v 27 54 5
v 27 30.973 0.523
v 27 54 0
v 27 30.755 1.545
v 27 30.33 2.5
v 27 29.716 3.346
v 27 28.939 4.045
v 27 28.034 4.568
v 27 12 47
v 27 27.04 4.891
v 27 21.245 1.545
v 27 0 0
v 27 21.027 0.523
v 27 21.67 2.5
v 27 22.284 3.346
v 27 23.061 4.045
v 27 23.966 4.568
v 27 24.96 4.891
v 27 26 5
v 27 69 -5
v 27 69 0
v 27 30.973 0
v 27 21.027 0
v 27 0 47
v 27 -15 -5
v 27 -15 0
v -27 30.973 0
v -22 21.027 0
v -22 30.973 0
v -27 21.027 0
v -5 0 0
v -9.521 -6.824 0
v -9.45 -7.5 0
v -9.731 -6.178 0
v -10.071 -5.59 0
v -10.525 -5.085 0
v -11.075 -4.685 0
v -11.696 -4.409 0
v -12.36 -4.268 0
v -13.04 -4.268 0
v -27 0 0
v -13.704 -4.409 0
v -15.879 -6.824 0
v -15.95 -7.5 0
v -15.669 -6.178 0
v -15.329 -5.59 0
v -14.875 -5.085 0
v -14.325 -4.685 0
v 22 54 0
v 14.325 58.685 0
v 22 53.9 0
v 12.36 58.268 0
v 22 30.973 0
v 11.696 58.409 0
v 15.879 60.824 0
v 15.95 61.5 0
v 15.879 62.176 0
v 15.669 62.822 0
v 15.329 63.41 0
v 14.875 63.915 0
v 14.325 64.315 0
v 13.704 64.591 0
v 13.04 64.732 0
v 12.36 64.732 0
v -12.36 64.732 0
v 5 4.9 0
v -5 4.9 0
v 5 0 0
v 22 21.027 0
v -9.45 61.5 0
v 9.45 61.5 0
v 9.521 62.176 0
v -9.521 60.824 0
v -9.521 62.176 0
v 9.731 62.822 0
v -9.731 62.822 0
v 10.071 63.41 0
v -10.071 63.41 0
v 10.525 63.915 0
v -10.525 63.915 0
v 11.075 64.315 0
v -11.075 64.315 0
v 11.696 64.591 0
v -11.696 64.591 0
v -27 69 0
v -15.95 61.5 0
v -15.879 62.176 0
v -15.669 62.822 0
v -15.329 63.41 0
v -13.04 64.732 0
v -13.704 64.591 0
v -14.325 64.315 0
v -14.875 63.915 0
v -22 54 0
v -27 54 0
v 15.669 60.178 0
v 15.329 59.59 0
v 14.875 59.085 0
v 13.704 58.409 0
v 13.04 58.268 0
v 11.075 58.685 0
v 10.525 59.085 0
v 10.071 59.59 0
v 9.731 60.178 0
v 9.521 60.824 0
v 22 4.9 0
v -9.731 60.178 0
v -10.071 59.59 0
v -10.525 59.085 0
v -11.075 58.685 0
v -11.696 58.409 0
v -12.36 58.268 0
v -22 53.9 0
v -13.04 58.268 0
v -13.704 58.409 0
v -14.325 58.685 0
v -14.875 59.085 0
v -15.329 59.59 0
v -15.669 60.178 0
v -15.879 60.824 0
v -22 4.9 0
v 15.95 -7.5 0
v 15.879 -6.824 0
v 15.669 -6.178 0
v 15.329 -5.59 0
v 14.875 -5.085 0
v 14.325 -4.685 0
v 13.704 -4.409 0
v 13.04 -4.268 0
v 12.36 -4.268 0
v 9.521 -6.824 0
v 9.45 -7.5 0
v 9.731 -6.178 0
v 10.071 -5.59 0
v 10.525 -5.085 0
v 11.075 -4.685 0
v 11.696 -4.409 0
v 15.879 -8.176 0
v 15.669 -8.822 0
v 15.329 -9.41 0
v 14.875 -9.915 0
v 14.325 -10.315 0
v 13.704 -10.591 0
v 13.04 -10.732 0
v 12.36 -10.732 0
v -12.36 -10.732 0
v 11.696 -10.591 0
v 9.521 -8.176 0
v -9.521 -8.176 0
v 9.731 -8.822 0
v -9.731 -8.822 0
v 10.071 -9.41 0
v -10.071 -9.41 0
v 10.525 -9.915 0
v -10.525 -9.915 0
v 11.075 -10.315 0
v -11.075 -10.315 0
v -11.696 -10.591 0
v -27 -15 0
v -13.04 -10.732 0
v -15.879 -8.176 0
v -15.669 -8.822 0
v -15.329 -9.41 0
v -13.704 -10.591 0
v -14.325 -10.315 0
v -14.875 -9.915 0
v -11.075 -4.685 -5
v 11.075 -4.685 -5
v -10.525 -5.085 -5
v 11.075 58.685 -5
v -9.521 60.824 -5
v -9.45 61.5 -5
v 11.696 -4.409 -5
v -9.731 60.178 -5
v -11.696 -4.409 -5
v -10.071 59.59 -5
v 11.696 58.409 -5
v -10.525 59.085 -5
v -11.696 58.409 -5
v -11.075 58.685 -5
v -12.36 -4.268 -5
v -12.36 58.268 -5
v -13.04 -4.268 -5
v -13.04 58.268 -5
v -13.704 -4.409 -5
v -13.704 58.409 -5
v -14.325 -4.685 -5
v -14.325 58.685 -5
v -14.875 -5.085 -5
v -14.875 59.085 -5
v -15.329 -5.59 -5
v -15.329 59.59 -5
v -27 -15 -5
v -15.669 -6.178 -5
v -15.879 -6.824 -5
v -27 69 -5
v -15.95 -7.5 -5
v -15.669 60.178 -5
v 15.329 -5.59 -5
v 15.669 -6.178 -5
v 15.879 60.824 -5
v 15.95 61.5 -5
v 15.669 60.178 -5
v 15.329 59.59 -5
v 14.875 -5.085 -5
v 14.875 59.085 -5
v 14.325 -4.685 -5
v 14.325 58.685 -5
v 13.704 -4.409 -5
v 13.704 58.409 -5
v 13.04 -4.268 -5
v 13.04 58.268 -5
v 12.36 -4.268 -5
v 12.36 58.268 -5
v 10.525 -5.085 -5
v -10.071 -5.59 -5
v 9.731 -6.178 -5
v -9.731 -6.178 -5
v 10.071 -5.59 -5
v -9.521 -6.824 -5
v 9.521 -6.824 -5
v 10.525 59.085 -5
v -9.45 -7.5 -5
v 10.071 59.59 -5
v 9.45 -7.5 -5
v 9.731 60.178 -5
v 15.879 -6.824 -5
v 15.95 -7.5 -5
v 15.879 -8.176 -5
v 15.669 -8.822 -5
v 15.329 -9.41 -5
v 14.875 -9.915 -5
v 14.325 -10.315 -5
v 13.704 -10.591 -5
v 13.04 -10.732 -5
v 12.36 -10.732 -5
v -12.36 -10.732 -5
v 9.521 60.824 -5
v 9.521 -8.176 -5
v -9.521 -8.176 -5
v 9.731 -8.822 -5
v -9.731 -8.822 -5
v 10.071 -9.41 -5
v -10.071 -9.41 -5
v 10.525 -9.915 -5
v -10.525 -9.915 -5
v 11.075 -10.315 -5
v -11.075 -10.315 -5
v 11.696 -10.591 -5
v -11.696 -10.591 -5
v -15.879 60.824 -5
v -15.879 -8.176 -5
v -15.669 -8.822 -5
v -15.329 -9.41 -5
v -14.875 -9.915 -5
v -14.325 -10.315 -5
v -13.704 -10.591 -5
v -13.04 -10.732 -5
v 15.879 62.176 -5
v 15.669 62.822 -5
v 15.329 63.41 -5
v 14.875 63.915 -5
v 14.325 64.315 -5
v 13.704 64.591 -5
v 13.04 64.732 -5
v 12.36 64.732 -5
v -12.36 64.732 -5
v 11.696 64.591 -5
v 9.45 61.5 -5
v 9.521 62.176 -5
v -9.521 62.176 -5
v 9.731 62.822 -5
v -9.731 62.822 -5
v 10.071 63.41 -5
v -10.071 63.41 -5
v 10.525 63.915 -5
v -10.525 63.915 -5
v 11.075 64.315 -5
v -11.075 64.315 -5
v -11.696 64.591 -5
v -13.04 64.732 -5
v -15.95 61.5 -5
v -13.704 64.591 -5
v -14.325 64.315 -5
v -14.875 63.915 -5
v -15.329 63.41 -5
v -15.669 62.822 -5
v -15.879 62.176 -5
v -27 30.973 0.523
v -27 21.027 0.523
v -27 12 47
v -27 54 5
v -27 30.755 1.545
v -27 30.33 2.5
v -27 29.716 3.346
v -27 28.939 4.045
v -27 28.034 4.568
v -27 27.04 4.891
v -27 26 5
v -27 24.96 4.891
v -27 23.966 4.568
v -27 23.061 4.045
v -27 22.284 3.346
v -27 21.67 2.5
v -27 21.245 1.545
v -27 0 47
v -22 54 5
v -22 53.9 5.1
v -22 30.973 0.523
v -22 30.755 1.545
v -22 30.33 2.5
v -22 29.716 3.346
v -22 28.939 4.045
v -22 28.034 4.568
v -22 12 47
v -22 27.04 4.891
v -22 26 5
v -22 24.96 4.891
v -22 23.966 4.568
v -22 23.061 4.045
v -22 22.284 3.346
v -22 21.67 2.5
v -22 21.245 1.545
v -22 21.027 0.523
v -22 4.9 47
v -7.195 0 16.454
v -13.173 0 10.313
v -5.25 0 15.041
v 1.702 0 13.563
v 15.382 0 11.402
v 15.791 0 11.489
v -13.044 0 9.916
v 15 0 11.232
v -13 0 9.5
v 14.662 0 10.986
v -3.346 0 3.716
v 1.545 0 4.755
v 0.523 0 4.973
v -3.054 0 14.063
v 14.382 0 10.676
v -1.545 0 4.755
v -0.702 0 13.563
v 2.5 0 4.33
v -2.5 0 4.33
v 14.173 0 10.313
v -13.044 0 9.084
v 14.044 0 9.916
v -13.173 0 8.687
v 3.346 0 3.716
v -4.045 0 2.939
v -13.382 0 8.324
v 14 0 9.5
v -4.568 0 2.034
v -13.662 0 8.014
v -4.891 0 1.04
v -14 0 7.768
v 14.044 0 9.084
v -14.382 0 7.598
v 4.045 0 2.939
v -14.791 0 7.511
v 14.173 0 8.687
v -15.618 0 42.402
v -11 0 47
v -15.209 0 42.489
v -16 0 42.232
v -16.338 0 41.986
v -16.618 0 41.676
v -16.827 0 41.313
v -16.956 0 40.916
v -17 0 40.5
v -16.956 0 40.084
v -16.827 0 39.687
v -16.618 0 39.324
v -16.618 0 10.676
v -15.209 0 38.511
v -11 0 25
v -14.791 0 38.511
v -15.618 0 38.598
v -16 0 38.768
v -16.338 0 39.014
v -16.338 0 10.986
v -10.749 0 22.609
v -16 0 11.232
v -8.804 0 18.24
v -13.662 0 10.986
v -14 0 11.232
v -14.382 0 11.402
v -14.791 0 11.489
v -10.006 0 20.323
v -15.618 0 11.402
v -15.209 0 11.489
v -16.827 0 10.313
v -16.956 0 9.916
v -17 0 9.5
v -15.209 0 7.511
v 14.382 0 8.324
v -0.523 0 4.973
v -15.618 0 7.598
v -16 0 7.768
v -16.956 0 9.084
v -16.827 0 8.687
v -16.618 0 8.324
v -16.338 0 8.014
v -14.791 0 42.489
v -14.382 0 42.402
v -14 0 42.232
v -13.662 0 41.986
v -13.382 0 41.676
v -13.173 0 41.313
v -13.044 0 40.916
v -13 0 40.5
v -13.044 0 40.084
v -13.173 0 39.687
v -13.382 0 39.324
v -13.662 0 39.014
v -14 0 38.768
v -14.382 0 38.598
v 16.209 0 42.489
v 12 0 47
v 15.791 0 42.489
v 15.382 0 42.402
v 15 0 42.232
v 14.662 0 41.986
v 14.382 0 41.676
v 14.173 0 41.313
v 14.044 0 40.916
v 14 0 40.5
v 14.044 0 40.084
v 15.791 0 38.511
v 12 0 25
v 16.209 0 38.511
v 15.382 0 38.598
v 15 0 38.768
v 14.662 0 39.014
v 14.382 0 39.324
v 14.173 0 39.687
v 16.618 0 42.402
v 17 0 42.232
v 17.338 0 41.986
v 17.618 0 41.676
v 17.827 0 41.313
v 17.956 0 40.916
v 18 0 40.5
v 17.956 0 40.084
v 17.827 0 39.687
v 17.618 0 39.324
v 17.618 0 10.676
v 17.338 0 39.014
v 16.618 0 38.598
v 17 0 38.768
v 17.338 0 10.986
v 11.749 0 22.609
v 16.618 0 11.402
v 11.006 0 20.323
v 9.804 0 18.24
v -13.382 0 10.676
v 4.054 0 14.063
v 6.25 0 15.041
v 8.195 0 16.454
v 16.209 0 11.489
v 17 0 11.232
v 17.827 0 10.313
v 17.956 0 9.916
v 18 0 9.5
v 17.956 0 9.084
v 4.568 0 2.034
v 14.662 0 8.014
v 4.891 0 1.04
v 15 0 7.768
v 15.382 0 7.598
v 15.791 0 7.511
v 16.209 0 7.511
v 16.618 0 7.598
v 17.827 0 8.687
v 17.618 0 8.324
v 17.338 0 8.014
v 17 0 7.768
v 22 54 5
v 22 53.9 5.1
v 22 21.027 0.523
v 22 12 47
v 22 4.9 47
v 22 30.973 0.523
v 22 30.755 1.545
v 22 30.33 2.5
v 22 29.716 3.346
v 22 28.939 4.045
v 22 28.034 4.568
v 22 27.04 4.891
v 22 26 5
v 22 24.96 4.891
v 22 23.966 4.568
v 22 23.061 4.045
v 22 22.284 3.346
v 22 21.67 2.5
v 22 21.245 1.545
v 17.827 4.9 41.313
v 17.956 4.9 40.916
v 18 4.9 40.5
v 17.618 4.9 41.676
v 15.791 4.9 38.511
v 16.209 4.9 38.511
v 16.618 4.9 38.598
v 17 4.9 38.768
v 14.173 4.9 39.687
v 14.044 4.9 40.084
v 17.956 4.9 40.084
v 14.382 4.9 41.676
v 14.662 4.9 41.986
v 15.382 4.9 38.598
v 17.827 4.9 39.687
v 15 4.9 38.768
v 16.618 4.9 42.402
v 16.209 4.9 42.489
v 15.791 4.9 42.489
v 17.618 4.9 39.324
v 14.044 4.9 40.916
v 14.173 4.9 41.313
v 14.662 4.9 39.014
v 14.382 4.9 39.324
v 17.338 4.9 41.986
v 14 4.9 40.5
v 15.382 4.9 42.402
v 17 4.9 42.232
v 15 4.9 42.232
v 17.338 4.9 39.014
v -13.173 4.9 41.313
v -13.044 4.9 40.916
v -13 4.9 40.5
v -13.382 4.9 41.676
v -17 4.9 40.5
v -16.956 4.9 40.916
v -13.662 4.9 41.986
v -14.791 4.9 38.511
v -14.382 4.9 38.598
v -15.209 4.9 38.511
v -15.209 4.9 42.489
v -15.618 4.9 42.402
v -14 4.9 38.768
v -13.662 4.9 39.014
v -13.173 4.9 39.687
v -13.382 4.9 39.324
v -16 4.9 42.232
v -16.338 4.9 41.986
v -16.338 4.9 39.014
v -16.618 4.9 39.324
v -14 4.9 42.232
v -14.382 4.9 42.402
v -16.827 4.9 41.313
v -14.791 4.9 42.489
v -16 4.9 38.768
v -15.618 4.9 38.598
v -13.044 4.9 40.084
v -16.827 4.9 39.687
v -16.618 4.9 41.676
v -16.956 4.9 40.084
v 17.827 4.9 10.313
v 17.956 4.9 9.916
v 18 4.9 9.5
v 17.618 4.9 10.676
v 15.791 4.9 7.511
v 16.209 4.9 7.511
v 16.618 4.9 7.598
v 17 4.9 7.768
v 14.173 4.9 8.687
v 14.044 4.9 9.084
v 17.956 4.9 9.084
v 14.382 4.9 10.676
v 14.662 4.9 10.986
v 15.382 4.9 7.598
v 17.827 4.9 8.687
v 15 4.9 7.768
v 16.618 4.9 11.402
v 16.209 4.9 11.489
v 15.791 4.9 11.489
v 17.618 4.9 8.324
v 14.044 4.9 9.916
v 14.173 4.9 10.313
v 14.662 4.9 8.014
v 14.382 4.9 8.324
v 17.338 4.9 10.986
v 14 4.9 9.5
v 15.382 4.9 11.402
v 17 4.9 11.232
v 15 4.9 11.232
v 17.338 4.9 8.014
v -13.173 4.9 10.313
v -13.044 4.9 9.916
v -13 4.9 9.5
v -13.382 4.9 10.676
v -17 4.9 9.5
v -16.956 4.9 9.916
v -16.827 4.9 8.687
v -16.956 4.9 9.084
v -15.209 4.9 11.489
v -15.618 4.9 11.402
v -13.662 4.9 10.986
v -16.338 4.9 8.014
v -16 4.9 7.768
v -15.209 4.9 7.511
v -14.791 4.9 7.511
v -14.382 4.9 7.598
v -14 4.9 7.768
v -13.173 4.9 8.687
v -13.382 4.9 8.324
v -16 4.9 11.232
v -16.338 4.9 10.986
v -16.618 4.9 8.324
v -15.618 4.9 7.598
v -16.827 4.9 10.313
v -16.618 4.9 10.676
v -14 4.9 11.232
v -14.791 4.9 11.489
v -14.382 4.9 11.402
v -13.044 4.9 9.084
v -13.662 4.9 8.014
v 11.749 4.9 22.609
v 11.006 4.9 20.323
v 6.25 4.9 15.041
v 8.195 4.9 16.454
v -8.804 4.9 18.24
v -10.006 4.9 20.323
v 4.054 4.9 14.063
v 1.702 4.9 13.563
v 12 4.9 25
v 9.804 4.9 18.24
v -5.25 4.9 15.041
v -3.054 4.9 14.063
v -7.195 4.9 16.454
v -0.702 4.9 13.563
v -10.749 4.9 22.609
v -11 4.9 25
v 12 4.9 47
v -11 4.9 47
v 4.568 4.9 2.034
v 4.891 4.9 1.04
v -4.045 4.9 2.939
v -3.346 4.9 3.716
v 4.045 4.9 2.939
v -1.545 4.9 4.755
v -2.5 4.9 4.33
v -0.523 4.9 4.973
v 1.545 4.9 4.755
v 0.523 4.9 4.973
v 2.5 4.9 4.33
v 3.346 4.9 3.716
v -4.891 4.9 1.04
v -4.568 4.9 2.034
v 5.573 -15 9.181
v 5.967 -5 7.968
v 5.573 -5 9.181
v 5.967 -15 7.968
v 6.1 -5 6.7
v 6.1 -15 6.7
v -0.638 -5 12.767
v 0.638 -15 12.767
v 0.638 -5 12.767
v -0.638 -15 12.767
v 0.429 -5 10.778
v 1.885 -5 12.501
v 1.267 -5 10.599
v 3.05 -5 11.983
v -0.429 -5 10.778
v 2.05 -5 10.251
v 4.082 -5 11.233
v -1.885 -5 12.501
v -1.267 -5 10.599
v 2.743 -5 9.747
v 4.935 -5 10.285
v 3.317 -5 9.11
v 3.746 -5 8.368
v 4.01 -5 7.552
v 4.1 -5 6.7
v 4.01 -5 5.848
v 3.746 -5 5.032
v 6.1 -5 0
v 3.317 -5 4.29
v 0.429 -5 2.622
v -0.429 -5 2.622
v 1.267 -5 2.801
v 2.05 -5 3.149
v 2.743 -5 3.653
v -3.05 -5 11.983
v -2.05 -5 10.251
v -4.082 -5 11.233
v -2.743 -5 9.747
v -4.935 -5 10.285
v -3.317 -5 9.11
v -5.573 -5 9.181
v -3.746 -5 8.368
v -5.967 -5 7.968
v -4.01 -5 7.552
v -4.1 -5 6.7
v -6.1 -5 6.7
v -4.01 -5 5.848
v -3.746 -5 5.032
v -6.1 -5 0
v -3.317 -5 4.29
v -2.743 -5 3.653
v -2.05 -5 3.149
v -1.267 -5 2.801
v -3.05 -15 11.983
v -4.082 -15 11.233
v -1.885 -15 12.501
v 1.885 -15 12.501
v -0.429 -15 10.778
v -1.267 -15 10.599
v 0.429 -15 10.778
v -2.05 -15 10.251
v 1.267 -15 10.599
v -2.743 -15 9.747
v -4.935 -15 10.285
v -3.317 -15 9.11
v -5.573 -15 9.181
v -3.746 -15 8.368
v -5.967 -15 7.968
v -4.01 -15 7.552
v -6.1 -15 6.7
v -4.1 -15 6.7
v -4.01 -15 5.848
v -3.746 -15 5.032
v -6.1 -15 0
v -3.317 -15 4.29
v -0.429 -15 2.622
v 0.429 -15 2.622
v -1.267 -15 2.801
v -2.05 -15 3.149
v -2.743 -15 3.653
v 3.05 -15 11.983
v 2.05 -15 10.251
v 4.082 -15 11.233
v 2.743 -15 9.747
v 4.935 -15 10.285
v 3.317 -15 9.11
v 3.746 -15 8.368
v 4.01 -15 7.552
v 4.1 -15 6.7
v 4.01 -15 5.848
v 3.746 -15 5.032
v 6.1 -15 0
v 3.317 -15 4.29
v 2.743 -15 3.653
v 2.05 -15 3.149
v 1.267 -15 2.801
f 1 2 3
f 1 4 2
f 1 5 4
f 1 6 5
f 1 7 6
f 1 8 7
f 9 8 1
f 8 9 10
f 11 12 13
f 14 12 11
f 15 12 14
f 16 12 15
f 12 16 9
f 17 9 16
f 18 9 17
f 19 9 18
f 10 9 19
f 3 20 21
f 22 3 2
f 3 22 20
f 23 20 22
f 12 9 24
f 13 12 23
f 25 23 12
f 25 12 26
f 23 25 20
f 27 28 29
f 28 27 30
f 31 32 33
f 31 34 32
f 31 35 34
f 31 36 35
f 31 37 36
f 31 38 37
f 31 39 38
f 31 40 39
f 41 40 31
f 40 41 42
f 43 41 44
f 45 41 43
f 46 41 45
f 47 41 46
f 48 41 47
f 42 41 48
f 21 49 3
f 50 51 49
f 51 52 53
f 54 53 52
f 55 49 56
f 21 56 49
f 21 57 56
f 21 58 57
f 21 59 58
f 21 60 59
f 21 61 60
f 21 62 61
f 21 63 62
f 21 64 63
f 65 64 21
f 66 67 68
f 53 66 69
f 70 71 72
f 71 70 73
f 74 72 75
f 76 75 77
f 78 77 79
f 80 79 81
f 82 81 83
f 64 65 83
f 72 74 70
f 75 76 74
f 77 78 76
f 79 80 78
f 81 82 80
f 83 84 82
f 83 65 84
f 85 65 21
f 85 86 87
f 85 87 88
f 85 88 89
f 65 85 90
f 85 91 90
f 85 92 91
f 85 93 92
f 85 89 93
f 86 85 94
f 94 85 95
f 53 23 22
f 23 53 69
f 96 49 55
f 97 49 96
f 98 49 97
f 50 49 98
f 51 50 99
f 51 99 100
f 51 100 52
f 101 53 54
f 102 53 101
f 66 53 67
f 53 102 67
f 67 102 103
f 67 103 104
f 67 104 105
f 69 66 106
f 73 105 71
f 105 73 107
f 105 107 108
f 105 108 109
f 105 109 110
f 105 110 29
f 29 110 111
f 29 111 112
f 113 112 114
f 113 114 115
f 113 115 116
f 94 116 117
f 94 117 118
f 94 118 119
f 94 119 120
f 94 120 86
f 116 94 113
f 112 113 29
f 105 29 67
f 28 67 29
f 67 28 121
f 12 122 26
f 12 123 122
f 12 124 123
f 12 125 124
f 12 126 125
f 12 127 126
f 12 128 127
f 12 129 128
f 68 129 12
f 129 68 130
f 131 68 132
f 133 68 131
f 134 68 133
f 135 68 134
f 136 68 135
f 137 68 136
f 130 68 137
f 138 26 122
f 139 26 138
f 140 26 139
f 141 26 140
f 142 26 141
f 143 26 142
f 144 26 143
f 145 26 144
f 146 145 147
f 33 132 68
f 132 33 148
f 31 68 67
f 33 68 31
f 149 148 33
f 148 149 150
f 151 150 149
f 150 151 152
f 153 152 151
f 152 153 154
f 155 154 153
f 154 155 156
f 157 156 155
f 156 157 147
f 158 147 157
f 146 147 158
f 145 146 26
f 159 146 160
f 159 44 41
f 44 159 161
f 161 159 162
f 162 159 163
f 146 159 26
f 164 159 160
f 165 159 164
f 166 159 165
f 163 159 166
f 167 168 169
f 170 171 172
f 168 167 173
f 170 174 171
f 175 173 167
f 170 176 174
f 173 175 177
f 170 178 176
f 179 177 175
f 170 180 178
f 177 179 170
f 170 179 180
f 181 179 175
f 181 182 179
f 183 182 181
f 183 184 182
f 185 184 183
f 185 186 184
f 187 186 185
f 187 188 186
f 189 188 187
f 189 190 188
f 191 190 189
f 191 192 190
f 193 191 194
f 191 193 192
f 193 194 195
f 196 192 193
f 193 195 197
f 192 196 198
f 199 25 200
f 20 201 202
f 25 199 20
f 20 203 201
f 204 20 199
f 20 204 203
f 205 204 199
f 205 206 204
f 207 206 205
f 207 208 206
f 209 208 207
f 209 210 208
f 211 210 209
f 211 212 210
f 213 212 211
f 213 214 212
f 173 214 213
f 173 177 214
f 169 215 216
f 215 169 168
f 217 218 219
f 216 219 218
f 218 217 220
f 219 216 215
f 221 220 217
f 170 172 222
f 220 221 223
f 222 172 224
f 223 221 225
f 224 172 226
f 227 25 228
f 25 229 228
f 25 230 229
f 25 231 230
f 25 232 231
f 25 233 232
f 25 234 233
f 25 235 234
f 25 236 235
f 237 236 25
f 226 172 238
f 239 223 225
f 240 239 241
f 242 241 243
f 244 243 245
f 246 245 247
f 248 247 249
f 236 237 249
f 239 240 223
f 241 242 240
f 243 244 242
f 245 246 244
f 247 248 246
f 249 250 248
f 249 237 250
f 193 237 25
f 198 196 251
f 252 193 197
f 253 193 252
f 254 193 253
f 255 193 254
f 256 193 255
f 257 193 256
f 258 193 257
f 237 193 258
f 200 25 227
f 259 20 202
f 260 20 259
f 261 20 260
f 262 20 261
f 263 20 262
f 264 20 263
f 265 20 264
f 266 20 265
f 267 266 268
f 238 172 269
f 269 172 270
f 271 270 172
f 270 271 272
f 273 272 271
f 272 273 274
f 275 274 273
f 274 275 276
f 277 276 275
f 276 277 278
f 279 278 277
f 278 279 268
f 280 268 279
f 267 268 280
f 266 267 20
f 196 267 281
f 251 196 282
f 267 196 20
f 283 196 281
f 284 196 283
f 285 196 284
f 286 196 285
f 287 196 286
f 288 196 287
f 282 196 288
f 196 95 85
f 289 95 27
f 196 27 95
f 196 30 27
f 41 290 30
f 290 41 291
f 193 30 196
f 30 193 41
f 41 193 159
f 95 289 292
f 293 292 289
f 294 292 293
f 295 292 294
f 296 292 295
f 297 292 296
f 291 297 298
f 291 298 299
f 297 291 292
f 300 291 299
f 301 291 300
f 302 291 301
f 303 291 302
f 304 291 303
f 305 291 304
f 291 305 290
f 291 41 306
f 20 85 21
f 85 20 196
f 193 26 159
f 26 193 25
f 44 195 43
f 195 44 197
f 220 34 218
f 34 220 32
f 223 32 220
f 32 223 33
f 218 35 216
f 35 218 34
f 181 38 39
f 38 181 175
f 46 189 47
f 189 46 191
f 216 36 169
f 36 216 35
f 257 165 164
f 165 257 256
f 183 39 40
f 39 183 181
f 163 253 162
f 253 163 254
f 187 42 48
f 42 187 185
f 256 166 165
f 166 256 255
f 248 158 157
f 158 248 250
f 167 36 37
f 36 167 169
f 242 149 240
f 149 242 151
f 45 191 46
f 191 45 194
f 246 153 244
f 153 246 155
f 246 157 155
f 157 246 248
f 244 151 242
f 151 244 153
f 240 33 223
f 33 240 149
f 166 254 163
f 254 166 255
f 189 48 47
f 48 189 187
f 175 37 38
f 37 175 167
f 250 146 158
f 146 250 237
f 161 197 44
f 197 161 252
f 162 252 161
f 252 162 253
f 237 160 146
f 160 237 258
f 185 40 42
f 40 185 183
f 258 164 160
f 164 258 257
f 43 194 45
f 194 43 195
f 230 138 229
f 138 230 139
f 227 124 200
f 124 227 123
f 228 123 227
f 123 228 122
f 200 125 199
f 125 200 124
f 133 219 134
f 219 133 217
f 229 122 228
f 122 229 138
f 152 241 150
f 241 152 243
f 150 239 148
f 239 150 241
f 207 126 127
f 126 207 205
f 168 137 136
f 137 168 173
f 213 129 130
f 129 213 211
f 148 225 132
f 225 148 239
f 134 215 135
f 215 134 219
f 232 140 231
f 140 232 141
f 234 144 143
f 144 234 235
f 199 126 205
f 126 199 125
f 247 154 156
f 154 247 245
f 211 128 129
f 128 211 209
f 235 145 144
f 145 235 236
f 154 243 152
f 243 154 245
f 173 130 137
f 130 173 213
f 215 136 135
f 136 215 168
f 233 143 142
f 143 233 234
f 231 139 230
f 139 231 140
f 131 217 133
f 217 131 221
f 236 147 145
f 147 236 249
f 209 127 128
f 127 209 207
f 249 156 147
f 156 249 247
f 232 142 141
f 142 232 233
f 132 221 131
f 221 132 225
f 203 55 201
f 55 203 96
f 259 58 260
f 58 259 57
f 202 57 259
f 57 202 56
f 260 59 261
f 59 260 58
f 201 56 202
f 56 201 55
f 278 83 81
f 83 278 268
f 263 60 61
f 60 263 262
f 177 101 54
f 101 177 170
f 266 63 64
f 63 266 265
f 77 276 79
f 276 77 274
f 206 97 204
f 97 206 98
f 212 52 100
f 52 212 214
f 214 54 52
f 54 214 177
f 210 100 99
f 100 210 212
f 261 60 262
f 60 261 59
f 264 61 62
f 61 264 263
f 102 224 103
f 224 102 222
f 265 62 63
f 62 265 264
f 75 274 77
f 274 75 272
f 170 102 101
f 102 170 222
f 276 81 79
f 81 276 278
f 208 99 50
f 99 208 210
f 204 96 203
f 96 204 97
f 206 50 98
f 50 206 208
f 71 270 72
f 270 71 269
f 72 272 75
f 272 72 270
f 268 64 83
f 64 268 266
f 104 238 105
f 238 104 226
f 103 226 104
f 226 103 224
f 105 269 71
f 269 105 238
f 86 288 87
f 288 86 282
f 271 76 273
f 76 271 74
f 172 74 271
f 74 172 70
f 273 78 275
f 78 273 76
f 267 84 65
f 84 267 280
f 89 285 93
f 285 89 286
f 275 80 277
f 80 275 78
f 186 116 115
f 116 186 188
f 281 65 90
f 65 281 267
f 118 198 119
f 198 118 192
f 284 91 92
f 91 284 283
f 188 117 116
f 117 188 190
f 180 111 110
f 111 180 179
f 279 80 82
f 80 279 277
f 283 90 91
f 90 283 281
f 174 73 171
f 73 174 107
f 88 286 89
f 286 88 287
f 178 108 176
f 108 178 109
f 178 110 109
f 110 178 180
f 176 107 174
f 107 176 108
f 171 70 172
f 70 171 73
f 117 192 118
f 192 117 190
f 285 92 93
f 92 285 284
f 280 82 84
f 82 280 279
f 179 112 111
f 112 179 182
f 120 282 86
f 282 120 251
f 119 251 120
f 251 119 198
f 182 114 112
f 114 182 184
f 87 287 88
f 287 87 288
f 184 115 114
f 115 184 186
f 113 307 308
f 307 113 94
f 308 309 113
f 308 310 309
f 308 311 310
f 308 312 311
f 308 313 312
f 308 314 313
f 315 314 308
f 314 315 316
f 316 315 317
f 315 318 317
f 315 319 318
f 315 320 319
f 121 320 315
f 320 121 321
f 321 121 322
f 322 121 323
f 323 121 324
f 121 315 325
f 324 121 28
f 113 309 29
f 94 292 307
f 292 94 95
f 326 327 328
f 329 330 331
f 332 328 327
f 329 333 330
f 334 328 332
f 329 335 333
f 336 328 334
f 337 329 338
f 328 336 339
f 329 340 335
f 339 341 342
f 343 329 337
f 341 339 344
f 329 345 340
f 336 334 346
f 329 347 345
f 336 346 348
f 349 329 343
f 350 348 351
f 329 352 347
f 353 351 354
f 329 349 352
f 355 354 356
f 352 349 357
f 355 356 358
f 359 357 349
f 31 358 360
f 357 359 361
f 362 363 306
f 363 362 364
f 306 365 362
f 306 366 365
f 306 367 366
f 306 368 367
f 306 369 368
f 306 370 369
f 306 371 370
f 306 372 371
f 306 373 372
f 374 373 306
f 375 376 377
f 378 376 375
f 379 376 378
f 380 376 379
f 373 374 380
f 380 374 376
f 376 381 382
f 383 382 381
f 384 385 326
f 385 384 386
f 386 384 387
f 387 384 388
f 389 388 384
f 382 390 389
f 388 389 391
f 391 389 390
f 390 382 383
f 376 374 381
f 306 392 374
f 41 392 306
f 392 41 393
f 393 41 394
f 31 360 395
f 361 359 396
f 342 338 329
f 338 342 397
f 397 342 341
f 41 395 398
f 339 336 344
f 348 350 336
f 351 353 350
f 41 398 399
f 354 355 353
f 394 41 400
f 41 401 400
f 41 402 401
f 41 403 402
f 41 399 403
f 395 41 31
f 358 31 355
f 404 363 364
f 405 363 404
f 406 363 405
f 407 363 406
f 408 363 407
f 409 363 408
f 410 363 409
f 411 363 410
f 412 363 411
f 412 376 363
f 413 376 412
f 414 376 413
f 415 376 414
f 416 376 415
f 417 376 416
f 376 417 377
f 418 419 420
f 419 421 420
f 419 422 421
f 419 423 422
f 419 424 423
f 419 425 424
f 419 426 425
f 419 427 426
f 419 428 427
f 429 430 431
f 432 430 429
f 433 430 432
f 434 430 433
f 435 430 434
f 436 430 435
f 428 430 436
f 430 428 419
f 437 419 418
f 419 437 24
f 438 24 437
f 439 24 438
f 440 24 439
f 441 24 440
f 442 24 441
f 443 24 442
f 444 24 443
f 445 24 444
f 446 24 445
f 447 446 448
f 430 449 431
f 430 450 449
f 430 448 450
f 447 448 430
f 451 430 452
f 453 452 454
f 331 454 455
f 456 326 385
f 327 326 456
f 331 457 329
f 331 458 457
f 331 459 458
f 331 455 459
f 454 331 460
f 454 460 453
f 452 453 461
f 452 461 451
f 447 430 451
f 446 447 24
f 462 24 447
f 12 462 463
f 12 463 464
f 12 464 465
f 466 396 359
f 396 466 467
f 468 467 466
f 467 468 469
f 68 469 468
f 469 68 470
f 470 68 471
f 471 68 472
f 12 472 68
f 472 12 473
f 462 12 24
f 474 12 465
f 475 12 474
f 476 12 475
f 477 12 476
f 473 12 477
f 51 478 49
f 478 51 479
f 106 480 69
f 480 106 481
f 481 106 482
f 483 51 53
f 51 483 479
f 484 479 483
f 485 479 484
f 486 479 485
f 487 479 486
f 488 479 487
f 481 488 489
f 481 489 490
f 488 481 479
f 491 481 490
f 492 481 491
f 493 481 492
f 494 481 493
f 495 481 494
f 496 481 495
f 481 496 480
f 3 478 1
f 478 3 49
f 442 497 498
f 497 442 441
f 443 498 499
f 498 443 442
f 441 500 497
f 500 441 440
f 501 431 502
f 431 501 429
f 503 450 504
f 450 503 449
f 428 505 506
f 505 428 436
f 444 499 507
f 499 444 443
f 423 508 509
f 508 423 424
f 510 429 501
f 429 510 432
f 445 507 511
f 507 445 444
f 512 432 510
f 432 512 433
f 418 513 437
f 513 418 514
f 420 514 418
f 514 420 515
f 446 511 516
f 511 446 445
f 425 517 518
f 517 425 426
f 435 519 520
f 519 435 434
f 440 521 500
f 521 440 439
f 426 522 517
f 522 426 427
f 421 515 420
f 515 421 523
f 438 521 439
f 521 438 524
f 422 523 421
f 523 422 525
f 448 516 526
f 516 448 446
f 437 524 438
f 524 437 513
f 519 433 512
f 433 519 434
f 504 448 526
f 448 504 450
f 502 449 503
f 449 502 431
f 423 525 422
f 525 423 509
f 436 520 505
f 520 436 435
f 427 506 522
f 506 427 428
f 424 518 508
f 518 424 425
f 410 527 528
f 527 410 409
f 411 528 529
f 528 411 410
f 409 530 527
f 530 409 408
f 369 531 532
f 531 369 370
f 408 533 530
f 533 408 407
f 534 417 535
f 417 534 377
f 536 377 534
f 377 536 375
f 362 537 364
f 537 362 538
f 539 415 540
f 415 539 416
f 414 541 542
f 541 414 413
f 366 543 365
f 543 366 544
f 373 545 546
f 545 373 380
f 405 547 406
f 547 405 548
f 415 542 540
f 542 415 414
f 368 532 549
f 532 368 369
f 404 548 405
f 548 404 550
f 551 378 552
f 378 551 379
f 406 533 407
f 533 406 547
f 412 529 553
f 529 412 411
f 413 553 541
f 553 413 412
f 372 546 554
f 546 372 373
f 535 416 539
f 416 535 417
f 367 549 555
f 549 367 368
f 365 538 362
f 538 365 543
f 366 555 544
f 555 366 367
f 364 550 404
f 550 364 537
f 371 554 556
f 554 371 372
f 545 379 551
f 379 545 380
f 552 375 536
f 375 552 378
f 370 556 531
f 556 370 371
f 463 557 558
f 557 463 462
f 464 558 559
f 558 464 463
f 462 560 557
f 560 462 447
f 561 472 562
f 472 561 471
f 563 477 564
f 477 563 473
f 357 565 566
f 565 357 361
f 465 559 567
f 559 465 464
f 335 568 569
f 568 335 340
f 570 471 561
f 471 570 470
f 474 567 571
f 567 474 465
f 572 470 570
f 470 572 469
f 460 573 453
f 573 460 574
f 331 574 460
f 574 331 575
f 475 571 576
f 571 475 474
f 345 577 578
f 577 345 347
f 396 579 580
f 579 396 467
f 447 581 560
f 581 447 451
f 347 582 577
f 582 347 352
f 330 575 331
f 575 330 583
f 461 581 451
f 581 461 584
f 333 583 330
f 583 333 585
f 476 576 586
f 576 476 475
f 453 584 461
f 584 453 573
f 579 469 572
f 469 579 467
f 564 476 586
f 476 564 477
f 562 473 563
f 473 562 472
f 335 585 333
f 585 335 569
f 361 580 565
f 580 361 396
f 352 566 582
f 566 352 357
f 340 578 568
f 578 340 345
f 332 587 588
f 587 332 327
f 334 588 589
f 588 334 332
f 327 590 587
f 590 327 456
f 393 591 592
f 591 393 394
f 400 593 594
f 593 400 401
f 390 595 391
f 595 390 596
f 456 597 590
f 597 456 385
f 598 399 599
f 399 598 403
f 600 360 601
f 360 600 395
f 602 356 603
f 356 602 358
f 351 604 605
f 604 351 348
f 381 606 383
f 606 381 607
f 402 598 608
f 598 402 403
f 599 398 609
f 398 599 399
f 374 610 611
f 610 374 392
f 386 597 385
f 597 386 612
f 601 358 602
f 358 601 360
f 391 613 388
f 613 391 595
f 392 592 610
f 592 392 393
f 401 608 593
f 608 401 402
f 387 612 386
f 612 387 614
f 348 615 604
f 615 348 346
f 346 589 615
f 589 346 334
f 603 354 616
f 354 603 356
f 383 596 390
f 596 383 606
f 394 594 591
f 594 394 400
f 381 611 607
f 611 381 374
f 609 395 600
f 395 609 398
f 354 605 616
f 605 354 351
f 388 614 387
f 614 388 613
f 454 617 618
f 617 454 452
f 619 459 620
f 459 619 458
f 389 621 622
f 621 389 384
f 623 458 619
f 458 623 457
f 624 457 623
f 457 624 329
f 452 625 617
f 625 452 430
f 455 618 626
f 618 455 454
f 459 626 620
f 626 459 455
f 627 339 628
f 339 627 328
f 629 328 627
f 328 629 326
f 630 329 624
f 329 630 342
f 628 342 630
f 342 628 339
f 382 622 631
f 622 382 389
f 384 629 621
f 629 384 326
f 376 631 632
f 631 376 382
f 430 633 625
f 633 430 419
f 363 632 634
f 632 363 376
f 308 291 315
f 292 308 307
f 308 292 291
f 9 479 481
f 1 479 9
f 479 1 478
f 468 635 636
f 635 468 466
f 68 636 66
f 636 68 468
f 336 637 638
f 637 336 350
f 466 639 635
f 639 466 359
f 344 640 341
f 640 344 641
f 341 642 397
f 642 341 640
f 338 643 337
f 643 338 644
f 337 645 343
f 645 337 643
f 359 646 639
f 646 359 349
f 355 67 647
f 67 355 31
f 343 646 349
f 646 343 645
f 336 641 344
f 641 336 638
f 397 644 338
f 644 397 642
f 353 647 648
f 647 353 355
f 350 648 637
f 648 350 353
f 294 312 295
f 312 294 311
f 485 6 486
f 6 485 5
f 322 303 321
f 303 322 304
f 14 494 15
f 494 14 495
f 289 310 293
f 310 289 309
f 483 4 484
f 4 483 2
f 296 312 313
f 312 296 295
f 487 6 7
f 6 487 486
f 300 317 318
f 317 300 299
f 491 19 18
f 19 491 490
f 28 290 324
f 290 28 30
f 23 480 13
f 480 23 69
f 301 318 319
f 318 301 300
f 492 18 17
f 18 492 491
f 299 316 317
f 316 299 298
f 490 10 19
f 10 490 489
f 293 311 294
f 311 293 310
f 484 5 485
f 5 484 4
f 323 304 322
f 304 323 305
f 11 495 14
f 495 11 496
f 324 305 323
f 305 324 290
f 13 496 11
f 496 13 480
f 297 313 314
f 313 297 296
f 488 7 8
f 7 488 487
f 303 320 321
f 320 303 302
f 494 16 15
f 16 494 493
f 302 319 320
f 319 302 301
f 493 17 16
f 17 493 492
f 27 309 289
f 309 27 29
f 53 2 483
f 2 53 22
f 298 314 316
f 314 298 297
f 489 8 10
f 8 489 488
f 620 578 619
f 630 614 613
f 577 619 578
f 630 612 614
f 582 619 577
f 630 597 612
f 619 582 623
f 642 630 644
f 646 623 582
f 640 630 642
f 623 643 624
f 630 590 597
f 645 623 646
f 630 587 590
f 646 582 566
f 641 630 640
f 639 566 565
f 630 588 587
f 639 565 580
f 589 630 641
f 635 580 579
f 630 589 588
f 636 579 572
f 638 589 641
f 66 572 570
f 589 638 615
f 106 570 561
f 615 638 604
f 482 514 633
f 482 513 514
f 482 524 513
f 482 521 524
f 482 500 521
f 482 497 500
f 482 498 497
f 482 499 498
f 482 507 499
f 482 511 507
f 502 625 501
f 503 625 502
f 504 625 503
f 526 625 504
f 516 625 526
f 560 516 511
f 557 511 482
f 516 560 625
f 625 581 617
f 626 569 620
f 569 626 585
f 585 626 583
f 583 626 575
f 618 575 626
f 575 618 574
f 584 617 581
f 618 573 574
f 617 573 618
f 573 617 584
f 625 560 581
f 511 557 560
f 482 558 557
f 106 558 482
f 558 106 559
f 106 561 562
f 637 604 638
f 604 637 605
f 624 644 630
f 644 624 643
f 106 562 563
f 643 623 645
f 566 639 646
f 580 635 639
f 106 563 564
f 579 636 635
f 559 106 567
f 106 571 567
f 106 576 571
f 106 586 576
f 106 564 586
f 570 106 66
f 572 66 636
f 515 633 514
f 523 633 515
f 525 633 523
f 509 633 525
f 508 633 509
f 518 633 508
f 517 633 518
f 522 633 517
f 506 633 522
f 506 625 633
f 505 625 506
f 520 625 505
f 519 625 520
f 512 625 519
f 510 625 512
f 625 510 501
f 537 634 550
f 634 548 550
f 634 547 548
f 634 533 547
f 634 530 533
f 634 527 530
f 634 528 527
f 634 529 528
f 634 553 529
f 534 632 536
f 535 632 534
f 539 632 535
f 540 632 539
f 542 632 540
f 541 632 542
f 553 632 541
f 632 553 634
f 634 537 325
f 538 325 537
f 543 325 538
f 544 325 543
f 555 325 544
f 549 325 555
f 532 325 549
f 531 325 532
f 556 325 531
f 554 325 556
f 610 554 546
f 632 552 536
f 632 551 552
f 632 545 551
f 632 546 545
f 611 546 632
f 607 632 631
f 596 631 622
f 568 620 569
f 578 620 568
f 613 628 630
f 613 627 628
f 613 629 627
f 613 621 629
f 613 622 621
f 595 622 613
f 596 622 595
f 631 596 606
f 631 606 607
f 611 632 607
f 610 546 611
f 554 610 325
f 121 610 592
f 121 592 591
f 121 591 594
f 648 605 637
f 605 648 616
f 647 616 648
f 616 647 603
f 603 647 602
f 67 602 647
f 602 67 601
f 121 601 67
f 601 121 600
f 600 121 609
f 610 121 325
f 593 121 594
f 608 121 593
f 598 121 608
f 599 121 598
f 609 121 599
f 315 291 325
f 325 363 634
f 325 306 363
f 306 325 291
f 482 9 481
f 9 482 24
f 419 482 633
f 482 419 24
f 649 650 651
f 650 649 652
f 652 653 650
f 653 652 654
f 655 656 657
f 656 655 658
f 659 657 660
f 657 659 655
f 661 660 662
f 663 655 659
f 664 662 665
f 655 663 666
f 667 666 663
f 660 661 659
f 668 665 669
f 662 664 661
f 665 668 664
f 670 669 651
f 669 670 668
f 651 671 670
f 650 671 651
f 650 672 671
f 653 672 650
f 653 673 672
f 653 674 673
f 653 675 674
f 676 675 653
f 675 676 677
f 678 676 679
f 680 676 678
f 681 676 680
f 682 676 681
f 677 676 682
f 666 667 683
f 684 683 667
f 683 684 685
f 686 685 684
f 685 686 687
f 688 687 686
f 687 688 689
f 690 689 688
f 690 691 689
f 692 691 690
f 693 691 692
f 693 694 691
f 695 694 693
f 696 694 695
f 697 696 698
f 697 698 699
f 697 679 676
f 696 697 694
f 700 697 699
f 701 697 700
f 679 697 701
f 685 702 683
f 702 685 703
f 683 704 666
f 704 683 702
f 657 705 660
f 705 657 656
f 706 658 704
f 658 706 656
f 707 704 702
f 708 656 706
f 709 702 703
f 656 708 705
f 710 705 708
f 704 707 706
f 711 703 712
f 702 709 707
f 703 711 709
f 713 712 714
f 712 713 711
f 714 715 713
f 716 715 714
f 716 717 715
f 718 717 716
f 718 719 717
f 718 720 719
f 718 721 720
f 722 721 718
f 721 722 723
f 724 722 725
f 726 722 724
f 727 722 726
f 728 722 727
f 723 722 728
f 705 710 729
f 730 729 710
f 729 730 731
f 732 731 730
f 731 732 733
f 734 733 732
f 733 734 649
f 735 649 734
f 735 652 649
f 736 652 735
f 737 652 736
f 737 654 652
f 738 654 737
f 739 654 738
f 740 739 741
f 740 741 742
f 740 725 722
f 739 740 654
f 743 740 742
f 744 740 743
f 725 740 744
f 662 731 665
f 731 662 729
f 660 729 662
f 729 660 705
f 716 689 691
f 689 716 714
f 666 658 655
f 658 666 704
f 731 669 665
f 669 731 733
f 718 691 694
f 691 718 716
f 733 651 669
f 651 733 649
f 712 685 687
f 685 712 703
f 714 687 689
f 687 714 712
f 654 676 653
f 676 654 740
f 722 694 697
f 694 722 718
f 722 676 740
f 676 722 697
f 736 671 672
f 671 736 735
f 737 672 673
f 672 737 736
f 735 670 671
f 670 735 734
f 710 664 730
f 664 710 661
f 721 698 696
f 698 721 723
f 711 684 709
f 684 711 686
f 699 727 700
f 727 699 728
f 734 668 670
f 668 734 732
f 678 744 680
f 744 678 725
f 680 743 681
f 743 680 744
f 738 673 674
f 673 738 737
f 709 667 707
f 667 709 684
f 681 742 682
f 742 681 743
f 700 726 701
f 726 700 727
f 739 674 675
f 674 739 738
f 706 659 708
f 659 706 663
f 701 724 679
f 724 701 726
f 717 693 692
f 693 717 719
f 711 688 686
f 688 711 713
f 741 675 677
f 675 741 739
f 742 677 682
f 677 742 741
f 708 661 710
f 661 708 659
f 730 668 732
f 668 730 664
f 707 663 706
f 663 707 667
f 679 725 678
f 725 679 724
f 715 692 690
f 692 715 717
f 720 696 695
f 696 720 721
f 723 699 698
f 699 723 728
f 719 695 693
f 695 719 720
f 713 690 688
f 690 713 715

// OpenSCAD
// file: syringePumpConstants.scad
/* === Project-universal Constants === */

//Not all of these variables are used in this specific model,
//but the same variable set is used across all models in this project.

$fs = 0.1;

inch = 25.4; //for mm conversion

//width of base
baseSizeY = 2*inch;
centerY = baseSizeY / 2; //both axes go right down the middle of the base

//stepper motor
stepperZSize = 42;
stepperYSize = 42;

//608 bearing 
bearing608Height = 8.5;
bearing608Diameter = 22.5;

//height of holder for 80/20 screws
mountPlateHeight = 5;

//axis heights
threadedAxisHeight = stepperZSize/2 + mountPlateHeight + 4;
smoothAxisHeight = (threadedAxisHeight-6.6) / 2;
smoothRodRadius = 4.1; //original value: 4.2, previously changed to 4.05

//syringe properties
barrelDiameter = 32;

//barrelSlotThickness = 3;
//barrelSlotHeight = 28;

syringeCenterHeight = threadedAxisHeight + bearing608Diameter/2 + 4 + barrelDiameter/2;

//Megan
plungerDiameter = 34; //previously 26.5, prev 35
plungerThickness = 2.7; //previously 3
plungerInnerDiameter = 19;//previously 15
plungerClipThickness = 3.5; //previously 3

//slot parameters
barrelSlotThickness = 2.5; //2.5, 1.7
barrelSlotHeight = 35;




//fixes render oddities
floatCorrection = 0.001; 
floatCorrection2 = 2*floatCorrection; 

//8020 mounting plate
screwPlateSize = 25;	
screwRadius = 3.5;
// main file
include <syringePumpConstants.scad>

nema_17_mount();

module nema_17_mount()
{
	wall_thickness = 5;
	motor_width = 42;
	frame_width = motor_width + (wall_thickness + 1)*2;
	bolt = 4;
	height = 25;

	inch = 25.4;
	screwPlateSize = 15;	
	screwRadius = 3.25;
	
	//these are all the mount point holes.
	x1 = -wall_thickness;
	y1 = wall_thickness*2;
	x2 = frame_width+wall_thickness;
	y2 = wall_thickness*2;
	x3 = -wall_thickness;
	y3 = frame_width-wall_thickness*2;
	x4 = frame_width + wall_thickness;
	y4 = frame_width-wall_thickness*2;
    
    //these are for the smooth rod holder - Megan
    holderHeight = 10;
    holderThickness = 2;
    
    
    
	//center the whole thing in X
	translate([-frame_width/2, 0, 0])
	{

		//floor, with mounting holes for 80/20
			
		translate([0,-screwPlateSize,-wall_thickness]){
			difference(){
				cube(size=[frame_width,frame_width+2*screwPlateSize,wall_thickness]);
				
				translate([frame_width/2-inch/2, screwPlateSize/2, 0]){
					cylinder(h=wall_thickness, r=screwRadius);
				}
				translate([frame_width/2+inch/2, screwPlateSize/2, 0]){
					cylinder(h=wall_thickness, r=screwRadius);
				}
                
                //top screw plate added - Megan
                translate([frame_width/2+inch/2, frame_width+screwPlateSize*(3/2), 0]){
					cylinder(h=wall_thickness, r=screwRadius);
				}
                translate([frame_width/2-inch/2, frame_width+screwPlateSize*(3/2), 0]){
					cylinder(h=wall_thickness, r=screwRadius);
				}

			}
		}

		difference()
		{
			//build the main unit.
			union()
			{
				//structure
				cube([wall_thickness, frame_width, frame_width]); //front face
				cube([frame_width, wall_thickness, frame_width]); //left face
				translate([frame_width-wall_thickness, 0, 0])     //right face
					cube([wall_thickness, frame_width, frame_width]);

			}


			//front left mount hole
			echo(x1, y1);
			translate([x1, y1, 0])
			{
				cylinder(r=bolt/2, h=wall_thickness);
				translate([0,0,wall_thickness])
					cylinder(r=bolt, h=wall_thickness*2);
			}
			
			//front right mount hole
			echo(x2, y2);
			translate([x2, y2, 0])
			{
				cylinder(r=bolt/2, h=wall_thickness);
				translate([0,0,wall_thickness])
					cylinder(r=bolt, h=wall_thickness*2);			
			}
			
			//rear left mount hole
			echo(x3, y3);
			translate([x3, y3, 0])
			{
				cylinder(r=bolt/2, h=wall_thickness);
				translate([0,0,wall_thickness])
					cylinder(r=bolt, h=wall_thickness*2);
			}
			
			//rear right mount hole
			echo(x4, y4);
			translate([x4, y4, 0])
			{
				cylinder(r=bolt/2, h=wall_thickness);
				translate([0,0,wall_thickness])
					cylinder(r=bolt, h=wall_thickness*2);
			}
			
			//mount hole slits
			translate([frame_width + wall_thickness*1.5, frame_width-wall_thickness*2, wall_thickness/2])
				cube(size=[wall_thickness, 0.1, wall_thickness*3], center=true);
			translate([frame_width + wall_thickness*1.5, wall_thickness*2, wall_thickness/2])
				cube(size=[wall_thickness, 0.1, wall_thickness*3], center=true);
			translate([-wall_thickness*1.5, frame_width-wall_thickness*2, wall_thickness/2])
				cube(size=[wall_thickness, 0.1, wall_thickness*3], center=true);
			translate([-wall_thickness*1.5, wall_thickness*2, wall_thickness/2])
				cube(size=[wall_thickness, 0.1, wall_thickness*3], center=true);

			//nema 17 mount
			rotate([90, 0, 0])
			{
				translate([frame_width/2+0.5, height, -wall_thickness])
				{
					translate([15.5, 15.5, 0])
						cylinder(r=bolt/2, h=wall_thickness+1);
					translate([-15.5, 15.5, 0])
						cylinder(r=bolt/2, h=wall_thickness+1);
					translate([15.5, -15.5, 0])
						cylinder(r=bolt/2, h=wall_thickness+1);
					translate([-15.5, -15.5, 0])
						cylinder(r=bolt/2, h=wall_thickness+1);

					cylinder(r=11.5, h=wall_thickness+1);

					translate([-11.5, 0, 0])
						cube([23, frame_width, wall_thickness+1]);
				}
			}

			//back slant cutaway
			translate([0, 0, frame_width+wall_thickness])
				rotate([45, 0, 0])
					translate([-frame_width, 0, -frame_width*2])
						cube(size=[frame_width*4, frame_width*2, frame_width*4]);

			//front anti-warp circle
			translate([frame_width/2, wall_thickness*1.25, 0])
				rotate([90, 0, 0])
					cylinder(r=wall_thickness, h=wall_thickness*2);

			//middle anti-warp circle			
			translate([0, motor_width/2 + wall_thickness, 0])
				rotate([0, 90, 0])
					cylinder(r=wall_thickness, h=frame_width+1);

			//cutout / tidy up cubes.
			translate([wall_thickness, wall_thickness-0.1, -1])
				cube([frame_width-wall_thickness*2, frame_width-wall_thickness, motor_width*2]);
			translate([-frame_width/2,-frame_width/2, wall_thickness+motor_width])
				cube([frame_width*2, frame_width*2, frame_width]);
			translate([-frame_width/2, -frame_width/2,-frame_width])
				cube([frame_width*2, frame_width*2, frame_width]);
		}
	}
    
    
    // motion shaft holder - Megan
    translate([0, -(screwPlateSize - holderHeight), smoothAxisHeight - wall_thickness])rotate([90,0,0]){
        difference(){
            union(){
                cylinder(h = holderHeight, r = smoothRodRadius+holderThickness);
                translate([-(smoothRodRadius + holderThickness), -(smoothAxisHeight-wall_thickness), 0]){
                    cube([2*(smoothRodRadius + holderThickness), smoothAxisHeight-wall_thickness, holderHeight]);
                }
            }
            cylinder(h = holderHeight, r = smoothRodRadius);
        }
    }
           

}
